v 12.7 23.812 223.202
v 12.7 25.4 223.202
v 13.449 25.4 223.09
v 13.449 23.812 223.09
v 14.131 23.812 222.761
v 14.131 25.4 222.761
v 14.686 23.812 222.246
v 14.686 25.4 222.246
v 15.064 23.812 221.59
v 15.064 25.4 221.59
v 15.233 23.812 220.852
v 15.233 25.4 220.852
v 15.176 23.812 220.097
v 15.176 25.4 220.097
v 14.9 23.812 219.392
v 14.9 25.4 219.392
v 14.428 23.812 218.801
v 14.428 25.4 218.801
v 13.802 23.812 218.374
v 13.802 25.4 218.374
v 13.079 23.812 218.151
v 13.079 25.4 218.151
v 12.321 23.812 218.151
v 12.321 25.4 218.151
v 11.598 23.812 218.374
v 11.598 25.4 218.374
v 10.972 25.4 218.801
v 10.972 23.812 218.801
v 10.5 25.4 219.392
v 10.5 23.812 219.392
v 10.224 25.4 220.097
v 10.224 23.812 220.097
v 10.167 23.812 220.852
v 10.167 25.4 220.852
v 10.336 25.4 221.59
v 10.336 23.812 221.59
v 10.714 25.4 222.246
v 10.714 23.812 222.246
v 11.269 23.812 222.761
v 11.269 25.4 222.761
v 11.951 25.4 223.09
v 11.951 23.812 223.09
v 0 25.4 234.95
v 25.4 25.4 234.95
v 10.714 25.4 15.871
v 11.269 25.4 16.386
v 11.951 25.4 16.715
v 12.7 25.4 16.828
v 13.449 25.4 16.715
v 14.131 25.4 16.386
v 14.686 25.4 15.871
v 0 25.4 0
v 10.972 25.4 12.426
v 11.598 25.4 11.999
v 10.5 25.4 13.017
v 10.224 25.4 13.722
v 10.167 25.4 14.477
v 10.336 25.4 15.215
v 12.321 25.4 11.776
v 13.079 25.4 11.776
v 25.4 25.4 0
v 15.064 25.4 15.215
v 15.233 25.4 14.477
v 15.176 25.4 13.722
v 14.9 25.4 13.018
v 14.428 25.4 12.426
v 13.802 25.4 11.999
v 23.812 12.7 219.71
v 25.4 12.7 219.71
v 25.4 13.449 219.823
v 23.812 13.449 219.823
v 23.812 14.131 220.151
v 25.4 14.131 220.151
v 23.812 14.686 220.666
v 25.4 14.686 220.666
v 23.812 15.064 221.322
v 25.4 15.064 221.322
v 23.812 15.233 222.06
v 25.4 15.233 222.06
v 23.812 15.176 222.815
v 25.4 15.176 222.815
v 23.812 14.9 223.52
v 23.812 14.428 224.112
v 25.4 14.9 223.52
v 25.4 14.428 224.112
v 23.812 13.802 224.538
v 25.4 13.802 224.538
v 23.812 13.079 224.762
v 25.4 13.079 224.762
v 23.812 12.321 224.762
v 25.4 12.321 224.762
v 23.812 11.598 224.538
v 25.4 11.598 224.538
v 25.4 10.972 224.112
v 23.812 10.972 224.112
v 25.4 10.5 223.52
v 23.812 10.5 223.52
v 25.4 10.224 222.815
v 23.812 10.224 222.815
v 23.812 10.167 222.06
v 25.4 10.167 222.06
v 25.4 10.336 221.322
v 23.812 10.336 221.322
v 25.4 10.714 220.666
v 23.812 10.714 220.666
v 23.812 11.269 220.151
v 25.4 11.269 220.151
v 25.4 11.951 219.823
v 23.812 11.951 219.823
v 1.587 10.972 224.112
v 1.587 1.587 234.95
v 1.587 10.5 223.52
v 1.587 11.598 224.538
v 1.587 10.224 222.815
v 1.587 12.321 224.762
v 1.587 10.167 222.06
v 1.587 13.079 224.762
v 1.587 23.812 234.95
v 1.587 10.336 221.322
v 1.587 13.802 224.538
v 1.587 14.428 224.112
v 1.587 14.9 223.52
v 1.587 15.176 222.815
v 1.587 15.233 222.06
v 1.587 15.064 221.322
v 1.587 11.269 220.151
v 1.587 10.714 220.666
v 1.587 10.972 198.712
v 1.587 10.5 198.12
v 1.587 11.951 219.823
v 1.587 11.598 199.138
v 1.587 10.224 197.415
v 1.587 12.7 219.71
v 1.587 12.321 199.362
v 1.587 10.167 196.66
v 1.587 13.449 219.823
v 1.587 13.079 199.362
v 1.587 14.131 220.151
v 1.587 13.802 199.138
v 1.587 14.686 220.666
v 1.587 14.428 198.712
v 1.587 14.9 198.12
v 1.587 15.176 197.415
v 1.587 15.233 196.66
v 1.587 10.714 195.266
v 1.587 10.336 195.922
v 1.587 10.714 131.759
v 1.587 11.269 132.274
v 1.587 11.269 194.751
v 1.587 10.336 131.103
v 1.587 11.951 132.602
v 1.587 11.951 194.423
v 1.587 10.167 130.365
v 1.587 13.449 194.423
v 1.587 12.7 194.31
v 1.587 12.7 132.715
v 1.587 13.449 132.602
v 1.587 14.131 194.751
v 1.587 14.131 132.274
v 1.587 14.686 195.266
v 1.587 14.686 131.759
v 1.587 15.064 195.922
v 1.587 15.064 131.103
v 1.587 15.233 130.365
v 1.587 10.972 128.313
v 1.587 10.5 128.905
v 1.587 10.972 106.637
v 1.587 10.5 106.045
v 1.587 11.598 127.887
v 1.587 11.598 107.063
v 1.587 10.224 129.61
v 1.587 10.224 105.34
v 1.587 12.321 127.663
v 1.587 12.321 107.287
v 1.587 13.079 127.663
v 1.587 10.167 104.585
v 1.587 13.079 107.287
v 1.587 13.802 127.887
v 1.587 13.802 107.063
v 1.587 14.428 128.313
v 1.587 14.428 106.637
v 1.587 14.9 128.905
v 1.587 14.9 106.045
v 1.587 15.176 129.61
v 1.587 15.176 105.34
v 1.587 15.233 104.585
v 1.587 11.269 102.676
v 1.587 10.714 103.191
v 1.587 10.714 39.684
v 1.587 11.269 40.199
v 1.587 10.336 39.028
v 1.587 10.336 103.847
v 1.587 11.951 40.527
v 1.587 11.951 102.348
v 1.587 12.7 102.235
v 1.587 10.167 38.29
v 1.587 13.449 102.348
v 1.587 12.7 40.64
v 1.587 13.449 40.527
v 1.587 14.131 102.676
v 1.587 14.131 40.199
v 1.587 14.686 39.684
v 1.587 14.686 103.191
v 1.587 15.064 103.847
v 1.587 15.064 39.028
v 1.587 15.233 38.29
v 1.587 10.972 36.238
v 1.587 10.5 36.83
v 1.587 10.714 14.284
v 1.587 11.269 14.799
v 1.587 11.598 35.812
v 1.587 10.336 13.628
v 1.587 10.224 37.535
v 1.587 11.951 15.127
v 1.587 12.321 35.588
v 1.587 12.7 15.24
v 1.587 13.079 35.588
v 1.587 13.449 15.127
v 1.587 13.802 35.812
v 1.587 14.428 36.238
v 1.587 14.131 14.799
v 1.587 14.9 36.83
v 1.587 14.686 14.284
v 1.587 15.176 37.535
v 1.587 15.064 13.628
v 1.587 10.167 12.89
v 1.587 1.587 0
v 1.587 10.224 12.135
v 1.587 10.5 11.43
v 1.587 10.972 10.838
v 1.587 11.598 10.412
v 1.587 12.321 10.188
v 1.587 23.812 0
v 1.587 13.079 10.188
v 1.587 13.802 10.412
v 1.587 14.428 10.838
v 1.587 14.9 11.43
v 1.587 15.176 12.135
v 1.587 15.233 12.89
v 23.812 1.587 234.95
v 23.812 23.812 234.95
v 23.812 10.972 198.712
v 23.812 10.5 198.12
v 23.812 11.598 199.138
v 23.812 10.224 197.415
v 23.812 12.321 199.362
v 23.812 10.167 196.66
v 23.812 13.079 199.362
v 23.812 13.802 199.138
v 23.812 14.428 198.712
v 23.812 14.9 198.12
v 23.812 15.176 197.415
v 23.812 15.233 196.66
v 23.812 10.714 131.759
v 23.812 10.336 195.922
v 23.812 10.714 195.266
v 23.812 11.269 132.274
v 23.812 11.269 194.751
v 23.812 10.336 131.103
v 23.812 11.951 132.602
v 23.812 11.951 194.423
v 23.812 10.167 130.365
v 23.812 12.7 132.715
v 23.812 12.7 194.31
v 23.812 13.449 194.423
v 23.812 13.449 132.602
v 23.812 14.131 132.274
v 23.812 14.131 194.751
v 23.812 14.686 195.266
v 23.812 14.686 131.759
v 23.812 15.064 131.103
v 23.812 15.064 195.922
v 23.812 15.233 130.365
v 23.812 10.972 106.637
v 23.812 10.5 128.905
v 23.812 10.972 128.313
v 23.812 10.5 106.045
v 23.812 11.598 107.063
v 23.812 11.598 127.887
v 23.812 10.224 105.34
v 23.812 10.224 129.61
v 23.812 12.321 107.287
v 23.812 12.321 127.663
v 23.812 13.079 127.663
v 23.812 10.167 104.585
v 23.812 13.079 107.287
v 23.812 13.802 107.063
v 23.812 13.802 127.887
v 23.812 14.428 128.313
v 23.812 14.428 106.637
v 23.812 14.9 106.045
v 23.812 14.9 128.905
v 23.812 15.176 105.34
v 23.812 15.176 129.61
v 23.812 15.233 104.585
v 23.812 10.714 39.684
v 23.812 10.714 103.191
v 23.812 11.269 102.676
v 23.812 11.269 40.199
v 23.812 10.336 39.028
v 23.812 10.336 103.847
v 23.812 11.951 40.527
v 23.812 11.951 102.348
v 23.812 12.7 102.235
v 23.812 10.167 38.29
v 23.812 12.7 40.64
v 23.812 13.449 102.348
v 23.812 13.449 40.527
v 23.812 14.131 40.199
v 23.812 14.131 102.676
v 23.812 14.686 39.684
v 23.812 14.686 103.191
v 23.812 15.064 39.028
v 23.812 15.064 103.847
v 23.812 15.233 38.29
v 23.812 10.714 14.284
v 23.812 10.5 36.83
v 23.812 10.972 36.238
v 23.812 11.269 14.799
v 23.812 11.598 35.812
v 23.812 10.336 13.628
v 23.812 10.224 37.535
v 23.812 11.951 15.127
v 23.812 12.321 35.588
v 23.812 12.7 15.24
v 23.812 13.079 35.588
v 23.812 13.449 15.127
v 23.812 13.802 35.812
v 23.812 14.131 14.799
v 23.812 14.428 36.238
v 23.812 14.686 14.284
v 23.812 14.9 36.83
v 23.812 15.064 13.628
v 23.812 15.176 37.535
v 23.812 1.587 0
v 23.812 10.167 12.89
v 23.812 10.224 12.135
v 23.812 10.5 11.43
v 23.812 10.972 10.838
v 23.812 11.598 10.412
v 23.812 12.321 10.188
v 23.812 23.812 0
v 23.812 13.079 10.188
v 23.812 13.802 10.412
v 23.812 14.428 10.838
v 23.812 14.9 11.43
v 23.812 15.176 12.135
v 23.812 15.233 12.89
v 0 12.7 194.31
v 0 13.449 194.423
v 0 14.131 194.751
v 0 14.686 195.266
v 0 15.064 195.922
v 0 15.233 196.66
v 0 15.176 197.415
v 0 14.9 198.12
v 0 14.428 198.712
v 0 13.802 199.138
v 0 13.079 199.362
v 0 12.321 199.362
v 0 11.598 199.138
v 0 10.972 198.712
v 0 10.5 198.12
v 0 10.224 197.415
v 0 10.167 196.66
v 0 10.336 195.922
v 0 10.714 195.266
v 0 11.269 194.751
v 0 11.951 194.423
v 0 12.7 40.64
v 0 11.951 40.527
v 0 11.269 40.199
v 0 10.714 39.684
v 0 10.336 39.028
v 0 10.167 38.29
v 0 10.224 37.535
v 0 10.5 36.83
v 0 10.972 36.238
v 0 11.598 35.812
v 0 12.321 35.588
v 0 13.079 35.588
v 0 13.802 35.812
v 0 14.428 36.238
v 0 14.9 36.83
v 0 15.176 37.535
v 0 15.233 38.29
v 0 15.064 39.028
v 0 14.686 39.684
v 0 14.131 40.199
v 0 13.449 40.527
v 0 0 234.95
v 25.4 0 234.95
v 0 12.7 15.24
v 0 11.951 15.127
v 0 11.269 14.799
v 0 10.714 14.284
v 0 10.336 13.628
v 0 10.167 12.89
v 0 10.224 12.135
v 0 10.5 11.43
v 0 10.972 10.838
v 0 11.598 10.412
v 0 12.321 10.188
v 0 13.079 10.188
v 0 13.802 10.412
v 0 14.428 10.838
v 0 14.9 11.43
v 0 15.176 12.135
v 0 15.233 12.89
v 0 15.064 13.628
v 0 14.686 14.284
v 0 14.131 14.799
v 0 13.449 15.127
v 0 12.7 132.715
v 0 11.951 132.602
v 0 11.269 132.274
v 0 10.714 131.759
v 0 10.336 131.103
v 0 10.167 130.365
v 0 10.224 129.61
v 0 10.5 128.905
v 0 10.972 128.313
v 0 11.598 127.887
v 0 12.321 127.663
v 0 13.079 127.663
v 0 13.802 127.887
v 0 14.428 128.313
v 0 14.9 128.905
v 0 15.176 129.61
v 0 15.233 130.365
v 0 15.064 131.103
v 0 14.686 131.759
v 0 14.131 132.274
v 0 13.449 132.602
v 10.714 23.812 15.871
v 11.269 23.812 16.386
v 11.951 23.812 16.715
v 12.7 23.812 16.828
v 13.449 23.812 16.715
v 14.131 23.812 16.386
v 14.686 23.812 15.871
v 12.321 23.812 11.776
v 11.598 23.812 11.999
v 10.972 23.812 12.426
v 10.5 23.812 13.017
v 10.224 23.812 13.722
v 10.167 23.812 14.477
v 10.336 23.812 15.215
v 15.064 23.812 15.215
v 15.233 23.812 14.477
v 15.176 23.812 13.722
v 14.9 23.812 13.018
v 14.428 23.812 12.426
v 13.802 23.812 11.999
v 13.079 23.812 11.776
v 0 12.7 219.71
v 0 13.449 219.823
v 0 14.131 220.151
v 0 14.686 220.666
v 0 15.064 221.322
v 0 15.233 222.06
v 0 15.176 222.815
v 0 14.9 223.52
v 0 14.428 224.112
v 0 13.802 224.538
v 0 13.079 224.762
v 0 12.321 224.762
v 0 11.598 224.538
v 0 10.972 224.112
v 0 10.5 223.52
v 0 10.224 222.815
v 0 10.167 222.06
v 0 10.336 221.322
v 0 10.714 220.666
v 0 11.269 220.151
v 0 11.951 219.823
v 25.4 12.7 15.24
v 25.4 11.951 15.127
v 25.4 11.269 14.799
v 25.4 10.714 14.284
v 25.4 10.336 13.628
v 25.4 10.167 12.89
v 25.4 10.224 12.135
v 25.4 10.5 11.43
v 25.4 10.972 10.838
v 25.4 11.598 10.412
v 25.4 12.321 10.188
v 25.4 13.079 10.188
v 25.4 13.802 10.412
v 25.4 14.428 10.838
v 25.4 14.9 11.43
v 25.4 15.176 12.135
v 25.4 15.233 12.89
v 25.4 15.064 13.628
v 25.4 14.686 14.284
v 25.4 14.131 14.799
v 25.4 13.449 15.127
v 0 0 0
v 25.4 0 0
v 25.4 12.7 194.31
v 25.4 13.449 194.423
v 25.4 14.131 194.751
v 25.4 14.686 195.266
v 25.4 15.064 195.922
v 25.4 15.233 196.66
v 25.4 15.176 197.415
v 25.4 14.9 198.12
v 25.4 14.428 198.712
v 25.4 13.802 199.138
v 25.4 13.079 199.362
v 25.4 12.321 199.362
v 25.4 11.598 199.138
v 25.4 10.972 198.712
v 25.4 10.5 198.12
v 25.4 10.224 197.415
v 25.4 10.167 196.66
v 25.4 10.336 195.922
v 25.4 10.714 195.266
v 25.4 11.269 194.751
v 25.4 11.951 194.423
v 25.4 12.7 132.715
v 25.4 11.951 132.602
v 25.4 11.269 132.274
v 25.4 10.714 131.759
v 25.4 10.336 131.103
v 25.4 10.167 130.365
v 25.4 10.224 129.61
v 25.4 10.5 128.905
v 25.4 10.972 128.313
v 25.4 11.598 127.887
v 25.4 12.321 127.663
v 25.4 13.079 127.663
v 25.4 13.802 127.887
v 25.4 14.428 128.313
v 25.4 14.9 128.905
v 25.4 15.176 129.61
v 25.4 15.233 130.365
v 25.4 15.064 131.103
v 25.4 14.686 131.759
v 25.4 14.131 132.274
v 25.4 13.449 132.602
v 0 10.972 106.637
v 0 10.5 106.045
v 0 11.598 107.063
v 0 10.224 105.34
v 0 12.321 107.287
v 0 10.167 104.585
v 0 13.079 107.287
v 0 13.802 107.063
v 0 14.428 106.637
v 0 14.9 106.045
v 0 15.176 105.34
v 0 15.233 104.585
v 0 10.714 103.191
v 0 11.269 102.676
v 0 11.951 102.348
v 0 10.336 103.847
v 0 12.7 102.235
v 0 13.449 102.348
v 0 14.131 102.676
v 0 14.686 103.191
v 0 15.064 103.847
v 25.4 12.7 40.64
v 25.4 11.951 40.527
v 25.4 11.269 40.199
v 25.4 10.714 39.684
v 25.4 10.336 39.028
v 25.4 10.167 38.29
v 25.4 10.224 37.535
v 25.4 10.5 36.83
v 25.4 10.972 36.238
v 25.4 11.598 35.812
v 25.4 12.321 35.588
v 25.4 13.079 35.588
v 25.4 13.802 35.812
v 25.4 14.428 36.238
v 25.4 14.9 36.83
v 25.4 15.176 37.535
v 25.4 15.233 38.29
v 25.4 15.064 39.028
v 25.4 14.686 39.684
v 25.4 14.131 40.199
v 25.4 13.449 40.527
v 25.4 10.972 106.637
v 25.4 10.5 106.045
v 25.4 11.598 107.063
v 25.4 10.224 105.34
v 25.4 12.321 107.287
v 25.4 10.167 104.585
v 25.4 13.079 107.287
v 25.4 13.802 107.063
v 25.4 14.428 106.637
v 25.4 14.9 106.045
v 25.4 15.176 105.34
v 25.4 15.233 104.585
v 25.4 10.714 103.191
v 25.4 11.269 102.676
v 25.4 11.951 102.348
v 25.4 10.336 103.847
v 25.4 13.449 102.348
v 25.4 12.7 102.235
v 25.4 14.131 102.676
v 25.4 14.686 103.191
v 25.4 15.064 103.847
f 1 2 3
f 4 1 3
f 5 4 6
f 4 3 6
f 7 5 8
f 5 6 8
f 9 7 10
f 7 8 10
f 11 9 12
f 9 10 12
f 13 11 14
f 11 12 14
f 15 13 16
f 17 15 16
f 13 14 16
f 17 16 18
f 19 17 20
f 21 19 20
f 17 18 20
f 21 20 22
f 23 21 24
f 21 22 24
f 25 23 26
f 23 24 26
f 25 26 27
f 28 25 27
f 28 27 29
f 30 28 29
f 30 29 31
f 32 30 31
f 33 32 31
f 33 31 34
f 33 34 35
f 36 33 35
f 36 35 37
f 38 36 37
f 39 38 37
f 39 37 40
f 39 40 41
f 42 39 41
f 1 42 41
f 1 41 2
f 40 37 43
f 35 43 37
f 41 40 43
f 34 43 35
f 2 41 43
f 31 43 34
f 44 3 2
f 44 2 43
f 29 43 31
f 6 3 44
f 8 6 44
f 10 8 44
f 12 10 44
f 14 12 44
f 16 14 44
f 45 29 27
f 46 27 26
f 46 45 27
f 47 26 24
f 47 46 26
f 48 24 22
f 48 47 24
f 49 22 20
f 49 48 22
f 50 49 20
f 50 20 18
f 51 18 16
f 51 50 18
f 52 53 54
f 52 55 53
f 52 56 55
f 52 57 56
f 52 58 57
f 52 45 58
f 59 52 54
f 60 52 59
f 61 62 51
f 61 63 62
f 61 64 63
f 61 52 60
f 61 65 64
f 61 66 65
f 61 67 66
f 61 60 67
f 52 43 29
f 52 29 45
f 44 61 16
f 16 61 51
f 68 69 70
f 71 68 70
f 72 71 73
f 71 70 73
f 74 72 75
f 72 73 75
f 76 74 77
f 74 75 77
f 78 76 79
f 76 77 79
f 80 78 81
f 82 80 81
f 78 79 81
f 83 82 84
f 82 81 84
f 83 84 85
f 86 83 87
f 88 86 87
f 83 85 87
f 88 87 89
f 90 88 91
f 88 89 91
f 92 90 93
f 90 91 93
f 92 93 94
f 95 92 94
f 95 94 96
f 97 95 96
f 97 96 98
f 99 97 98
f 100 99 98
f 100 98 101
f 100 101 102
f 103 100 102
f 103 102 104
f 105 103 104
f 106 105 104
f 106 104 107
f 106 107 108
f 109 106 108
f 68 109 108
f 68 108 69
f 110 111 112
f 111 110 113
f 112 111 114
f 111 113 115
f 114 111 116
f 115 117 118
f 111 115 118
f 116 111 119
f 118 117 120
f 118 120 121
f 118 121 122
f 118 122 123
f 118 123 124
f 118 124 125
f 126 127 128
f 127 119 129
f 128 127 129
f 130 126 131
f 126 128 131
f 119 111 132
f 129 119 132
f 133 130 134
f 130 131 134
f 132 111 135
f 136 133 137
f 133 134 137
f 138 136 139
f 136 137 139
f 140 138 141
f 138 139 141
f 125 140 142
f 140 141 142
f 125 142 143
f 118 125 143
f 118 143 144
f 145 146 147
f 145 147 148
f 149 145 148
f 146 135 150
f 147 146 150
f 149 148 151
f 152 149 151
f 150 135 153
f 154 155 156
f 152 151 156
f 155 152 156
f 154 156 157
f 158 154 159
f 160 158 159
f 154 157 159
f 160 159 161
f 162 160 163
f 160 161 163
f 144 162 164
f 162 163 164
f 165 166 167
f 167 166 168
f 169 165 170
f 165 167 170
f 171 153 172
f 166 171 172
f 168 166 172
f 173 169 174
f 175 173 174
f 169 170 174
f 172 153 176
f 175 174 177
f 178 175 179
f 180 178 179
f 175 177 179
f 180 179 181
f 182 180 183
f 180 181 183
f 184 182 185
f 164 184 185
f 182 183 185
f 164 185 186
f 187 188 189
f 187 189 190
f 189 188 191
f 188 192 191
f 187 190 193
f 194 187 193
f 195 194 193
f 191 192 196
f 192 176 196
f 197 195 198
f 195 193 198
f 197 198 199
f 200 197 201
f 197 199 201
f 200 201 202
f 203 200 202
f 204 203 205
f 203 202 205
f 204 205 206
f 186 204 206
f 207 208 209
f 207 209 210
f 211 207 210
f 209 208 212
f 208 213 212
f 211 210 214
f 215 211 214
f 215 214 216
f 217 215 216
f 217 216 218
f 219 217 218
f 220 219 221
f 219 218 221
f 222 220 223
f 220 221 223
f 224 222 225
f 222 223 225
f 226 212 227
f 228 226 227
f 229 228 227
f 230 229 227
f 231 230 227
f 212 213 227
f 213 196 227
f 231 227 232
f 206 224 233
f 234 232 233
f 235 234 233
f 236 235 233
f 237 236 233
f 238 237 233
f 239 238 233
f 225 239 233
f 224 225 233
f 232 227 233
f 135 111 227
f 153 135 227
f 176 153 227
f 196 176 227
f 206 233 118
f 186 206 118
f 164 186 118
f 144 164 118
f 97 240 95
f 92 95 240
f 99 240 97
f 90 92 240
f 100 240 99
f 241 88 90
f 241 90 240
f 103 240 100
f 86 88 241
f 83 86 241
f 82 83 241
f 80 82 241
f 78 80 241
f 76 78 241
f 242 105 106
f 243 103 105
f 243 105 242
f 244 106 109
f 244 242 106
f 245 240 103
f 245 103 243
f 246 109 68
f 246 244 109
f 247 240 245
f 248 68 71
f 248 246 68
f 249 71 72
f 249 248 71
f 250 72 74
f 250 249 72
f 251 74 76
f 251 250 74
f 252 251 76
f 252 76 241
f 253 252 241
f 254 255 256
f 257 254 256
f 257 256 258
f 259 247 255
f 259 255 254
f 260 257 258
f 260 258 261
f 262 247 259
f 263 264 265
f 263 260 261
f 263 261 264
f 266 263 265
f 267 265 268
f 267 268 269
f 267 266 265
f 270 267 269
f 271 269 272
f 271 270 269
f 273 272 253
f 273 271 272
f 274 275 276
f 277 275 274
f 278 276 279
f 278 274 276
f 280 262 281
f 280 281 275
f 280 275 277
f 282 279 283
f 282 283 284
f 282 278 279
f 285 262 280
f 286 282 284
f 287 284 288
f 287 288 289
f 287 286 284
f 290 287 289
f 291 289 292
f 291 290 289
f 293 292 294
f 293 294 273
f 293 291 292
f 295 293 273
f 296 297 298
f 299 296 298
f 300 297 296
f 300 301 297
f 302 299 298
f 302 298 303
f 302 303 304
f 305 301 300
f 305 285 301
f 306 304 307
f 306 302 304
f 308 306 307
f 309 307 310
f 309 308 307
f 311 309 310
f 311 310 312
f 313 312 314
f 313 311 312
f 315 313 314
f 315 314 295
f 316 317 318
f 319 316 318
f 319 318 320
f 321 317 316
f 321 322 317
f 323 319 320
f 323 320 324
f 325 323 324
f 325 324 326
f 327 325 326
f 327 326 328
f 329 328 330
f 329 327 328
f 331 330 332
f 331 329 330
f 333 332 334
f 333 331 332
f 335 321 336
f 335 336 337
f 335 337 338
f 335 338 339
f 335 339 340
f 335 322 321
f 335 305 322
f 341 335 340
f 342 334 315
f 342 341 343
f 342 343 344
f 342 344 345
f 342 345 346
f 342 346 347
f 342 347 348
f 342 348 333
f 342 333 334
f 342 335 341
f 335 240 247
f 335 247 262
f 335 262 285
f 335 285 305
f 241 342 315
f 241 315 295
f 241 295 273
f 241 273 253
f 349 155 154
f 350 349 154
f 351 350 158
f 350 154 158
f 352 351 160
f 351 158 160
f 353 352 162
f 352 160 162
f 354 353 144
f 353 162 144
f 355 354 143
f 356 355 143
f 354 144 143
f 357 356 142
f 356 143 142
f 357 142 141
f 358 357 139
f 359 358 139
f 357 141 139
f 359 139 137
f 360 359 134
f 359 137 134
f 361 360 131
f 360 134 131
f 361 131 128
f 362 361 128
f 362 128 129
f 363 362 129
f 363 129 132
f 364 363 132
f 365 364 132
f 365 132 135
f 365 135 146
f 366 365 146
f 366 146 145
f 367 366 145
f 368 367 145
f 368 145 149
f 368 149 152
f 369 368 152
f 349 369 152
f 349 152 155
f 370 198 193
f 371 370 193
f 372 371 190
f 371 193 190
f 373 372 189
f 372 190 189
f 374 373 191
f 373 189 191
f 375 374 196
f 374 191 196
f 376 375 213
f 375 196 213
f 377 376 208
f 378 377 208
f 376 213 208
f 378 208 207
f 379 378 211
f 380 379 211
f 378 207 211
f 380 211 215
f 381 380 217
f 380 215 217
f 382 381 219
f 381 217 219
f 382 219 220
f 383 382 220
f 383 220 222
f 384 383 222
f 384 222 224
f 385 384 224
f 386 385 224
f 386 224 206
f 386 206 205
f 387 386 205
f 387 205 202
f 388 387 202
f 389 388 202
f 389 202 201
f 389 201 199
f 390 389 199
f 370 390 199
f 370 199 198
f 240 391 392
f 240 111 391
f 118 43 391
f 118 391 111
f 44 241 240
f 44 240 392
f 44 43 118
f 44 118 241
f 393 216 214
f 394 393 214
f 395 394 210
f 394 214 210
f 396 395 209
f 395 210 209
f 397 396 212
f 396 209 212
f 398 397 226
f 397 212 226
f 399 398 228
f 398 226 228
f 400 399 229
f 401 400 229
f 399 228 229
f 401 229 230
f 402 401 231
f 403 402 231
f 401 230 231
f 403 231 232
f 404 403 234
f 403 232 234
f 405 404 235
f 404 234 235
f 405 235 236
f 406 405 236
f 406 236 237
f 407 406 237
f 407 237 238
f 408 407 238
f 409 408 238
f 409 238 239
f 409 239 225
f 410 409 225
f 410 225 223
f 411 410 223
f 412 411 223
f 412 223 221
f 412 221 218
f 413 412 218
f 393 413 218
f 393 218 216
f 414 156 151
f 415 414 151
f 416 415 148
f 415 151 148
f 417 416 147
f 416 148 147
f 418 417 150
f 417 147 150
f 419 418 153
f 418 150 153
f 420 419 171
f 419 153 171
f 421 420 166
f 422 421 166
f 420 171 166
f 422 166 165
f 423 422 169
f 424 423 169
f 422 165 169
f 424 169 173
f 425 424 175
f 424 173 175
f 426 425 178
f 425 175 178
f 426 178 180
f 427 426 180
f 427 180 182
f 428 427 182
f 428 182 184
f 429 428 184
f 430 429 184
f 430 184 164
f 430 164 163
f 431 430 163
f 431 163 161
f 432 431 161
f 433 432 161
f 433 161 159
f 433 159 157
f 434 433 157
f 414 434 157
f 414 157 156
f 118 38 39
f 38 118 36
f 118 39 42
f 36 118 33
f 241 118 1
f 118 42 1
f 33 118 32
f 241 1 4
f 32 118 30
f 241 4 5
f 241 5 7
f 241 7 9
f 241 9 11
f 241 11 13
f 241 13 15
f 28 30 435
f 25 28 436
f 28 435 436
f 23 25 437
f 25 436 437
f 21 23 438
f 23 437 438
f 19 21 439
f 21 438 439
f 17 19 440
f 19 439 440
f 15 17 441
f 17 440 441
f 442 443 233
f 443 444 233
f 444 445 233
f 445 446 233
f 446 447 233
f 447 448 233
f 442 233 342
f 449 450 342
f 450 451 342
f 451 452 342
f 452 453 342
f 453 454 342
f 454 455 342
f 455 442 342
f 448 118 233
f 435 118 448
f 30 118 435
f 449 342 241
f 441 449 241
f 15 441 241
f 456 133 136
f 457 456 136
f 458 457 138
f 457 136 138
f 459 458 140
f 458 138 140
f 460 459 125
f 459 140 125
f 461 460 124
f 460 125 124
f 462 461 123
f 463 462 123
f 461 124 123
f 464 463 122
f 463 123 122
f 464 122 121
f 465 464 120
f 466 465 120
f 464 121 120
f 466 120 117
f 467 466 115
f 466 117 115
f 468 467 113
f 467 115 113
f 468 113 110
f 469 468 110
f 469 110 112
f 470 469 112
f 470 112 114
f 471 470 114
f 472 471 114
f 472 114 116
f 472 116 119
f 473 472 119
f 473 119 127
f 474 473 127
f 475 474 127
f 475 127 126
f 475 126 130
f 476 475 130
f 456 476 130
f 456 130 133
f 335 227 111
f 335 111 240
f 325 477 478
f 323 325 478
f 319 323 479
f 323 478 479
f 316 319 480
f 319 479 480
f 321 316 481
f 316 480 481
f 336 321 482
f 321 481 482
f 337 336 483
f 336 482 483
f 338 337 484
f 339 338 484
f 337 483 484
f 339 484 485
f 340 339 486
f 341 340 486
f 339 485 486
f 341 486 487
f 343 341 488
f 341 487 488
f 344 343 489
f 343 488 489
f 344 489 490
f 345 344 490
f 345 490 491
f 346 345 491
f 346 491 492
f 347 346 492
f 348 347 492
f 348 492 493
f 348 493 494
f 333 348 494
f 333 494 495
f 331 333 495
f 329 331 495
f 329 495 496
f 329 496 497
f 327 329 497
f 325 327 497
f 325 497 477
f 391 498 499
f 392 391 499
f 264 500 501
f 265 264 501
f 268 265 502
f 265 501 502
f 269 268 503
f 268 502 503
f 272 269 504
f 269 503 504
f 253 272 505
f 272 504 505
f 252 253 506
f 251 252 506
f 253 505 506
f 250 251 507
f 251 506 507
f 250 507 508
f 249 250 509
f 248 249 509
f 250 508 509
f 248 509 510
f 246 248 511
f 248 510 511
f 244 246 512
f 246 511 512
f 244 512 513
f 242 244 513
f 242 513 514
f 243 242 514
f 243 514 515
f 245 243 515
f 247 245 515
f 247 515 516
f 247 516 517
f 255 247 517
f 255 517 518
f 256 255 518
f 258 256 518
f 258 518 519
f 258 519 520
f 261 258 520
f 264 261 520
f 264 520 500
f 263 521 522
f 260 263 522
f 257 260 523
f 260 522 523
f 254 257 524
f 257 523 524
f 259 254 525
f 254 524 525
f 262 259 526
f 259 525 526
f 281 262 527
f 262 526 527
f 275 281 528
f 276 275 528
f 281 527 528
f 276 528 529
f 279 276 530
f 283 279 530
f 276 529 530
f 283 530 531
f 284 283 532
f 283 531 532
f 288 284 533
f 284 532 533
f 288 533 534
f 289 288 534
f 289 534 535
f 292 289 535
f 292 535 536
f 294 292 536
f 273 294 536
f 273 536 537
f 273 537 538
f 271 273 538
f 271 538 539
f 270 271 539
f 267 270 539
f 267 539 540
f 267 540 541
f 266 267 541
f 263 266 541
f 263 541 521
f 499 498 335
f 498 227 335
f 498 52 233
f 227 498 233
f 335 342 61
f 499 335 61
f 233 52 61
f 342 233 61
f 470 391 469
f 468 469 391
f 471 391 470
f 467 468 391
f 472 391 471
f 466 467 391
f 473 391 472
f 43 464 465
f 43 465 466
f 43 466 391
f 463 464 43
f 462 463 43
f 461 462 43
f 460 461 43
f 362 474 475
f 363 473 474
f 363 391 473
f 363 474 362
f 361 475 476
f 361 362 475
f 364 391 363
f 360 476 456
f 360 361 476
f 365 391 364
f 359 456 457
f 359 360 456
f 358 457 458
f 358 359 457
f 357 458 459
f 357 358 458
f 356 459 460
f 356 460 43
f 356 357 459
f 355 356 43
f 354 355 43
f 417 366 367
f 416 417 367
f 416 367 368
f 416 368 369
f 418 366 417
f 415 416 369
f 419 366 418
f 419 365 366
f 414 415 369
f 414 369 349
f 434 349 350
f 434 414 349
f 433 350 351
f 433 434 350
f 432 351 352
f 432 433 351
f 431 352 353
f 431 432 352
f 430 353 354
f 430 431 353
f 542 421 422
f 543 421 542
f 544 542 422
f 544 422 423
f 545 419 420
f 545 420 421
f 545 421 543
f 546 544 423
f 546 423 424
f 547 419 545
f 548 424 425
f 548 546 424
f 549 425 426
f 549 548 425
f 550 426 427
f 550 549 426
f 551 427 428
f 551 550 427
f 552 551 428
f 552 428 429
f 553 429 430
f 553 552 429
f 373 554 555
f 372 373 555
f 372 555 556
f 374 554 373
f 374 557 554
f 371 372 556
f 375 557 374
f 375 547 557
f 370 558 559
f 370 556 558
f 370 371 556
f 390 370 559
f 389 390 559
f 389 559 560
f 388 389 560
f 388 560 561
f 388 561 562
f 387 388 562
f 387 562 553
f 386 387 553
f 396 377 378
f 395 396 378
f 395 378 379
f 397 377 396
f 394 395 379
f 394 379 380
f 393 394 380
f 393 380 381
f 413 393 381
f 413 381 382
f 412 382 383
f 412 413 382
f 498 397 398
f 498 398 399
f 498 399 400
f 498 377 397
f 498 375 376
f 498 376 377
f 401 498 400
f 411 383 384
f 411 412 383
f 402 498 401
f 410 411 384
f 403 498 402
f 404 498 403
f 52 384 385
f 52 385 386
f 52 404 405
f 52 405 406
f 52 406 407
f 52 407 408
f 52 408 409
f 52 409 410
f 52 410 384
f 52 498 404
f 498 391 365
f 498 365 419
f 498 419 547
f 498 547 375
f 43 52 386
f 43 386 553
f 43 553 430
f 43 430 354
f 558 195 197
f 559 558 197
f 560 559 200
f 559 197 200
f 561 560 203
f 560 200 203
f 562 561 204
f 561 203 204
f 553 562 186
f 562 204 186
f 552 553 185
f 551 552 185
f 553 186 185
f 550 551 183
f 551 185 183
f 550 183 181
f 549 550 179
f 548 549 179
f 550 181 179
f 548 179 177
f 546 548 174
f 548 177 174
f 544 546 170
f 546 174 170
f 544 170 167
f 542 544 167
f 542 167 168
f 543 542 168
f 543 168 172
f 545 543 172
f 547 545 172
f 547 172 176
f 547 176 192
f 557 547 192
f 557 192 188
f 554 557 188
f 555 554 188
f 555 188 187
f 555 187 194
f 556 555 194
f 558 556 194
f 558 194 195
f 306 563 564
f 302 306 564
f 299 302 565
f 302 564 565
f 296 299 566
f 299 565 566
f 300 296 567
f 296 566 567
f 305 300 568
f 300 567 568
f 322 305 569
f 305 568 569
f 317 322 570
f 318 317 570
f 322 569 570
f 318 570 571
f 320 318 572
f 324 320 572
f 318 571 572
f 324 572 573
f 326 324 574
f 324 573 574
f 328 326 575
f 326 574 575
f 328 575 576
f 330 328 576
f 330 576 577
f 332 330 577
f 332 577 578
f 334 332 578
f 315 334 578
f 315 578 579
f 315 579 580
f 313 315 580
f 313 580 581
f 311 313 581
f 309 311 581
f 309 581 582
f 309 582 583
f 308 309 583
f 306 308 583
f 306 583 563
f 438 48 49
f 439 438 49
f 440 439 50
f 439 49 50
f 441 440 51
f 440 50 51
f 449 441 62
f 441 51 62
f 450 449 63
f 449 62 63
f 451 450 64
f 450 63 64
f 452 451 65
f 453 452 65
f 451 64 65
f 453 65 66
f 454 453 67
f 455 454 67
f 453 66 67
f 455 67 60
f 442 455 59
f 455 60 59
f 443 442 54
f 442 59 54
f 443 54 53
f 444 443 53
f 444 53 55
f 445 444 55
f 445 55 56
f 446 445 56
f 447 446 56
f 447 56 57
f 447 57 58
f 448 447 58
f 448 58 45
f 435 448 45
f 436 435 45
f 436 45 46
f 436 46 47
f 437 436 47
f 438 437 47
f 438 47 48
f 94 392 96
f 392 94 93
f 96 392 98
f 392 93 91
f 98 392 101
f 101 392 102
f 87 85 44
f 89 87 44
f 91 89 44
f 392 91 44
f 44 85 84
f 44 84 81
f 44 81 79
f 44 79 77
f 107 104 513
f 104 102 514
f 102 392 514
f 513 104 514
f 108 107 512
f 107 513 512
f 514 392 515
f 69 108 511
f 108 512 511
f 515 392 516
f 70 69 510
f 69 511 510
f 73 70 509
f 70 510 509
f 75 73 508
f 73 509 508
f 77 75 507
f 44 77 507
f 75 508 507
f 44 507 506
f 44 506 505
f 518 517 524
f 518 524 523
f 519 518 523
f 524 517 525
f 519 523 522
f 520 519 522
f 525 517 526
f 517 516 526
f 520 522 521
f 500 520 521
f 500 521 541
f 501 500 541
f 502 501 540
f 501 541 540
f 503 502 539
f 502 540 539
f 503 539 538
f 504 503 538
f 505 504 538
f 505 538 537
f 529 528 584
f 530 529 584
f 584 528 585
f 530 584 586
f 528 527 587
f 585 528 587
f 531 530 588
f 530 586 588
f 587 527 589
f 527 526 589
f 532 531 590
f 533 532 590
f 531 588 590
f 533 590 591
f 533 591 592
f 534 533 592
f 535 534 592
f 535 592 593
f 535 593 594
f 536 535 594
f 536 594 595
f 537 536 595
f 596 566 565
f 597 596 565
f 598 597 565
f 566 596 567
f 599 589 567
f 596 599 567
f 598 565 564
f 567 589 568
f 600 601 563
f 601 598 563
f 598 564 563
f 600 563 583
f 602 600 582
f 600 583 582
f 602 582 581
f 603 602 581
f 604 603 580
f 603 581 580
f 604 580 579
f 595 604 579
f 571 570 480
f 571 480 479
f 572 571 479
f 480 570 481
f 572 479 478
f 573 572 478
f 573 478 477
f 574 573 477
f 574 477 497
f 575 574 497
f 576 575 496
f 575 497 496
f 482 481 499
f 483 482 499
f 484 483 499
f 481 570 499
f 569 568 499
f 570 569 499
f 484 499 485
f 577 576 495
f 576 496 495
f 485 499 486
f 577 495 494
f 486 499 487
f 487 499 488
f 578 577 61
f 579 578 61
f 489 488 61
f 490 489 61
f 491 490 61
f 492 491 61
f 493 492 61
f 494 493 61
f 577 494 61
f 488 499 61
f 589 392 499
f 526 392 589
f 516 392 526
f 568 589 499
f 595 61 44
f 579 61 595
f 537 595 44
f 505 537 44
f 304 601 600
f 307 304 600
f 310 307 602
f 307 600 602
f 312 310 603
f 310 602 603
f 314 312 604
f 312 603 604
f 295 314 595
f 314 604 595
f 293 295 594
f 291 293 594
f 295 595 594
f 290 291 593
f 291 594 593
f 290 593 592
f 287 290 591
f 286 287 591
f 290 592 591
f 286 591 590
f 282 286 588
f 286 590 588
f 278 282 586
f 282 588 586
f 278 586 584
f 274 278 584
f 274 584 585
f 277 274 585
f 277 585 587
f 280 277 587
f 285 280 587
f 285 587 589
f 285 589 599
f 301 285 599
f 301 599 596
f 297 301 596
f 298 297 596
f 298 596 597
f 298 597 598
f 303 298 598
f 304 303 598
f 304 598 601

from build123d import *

# Parameters (mm, degrees)
SKETCH1_W           = 25.4
SKETCH1_H           = 25.4
SKETCH1_W_2         = 22.225
SKETCH1_H_2         = 22.225
BOSS_EXTRUDE1_DEPTH = 234.95
SKETCH4_R           = 2.54
CUT_EXTRUDE3_DEPTH  = 238.680084357
CUT_EXTRUDE4_REACH  = 239.68
SKETCH5_R           = 2.54


with BuildPart() as part:
    # Sketch1 → Boss-Extrude1 (new body)
    with BuildSketch(Plane.XY):
        with Locations((12.7, 12.7)):
            Rectangle(SKETCH1_W, SKETCH1_H)
        with Locations((12.7, 12.7)):
            Rectangle(SKETCH1_W_2, SKETCH1_H_2, mode=Mode.SUBTRACT)
    extrude(amount=BOSS_EXTRUDE1_DEPTH)

    # Sketch4 → Cut-Extrude3 (cut, through all)
    with BuildSketch(Plane(origin=(25.4, 0, 0), x_dir=(0, 0, -1), z_dir=(1, 0, 0))):
        with Locations((-222.25, 12.7)):
            Circle(SKETCH4_R)
        with Locations((-196.85, 12.7)):
            Circle(SKETCH4_R)
        with Locations(Location((-38.1, 12.7, 0), (0, 0, 180))):
            Circle(SKETCH4_R)
        with Locations(Location((-12.7, 12.7, 0), (0, 0, 180))):
            Circle(SKETCH4_R)
        with Locations((-104.775, 12.7)):
            Circle(SKETCH4_R)
        with Locations(Location((-130.175, 12.7, 0), (0, 0, 180))):
            Circle(SKETCH4_R)
    extrude(amount=-CUT_EXTRUDE3_DEPTH, mode=Mode.SUBTRACT)

    # Sketch5 → Cut-Extrude4 (cut, up to next)
    with BuildSketch(Plane(origin=(0, 25.4, 0), x_dir=(1, 0, 0), z_dir=(0, 1, 0)), mode=Mode.PRIVATE) as cut_extrude4_sk1:
        with Locations(Location((12.7, -220.6625, 0), (0, 0, 270))):
            Circle(SKETCH5_R)
    cut_extrude4_tool1 = extrude(cut_extrude4_sk1.sketch, amount=-CUT_EXTRUDE4_REACH, mode=Mode.PRIVATE) & part.part
    # Sketch5 → Cut-Extrude4 (cut, up to next)
    with BuildSketch(Plane(origin=(0, 25.4, 0), x_dir=(1, 0, 0), z_dir=(0, 1, 0)), mode=Mode.PRIVATE) as cut_extrude4_sk2:
        with Locations(Location((12.7, -14.2875, 0), (0, 0, 270))):
            Circle(SKETCH5_R)
    cut_extrude4_tool2 = extrude(cut_extrude4_sk2.sketch, amount=-CUT_EXTRUDE4_REACH, mode=Mode.PRIVATE) & part.part
    add(cut_extrude4_tool1.solids().sort_by_distance((12.7, 25.4, 220.6625))[0], mode=Mode.SUBTRACT)
    add(cut_extrude4_tool2.solids().sort_by_distance((12.7, 25.4, 14.2875))[0], mode=Mode.SUBTRACT)


solid = part.part
